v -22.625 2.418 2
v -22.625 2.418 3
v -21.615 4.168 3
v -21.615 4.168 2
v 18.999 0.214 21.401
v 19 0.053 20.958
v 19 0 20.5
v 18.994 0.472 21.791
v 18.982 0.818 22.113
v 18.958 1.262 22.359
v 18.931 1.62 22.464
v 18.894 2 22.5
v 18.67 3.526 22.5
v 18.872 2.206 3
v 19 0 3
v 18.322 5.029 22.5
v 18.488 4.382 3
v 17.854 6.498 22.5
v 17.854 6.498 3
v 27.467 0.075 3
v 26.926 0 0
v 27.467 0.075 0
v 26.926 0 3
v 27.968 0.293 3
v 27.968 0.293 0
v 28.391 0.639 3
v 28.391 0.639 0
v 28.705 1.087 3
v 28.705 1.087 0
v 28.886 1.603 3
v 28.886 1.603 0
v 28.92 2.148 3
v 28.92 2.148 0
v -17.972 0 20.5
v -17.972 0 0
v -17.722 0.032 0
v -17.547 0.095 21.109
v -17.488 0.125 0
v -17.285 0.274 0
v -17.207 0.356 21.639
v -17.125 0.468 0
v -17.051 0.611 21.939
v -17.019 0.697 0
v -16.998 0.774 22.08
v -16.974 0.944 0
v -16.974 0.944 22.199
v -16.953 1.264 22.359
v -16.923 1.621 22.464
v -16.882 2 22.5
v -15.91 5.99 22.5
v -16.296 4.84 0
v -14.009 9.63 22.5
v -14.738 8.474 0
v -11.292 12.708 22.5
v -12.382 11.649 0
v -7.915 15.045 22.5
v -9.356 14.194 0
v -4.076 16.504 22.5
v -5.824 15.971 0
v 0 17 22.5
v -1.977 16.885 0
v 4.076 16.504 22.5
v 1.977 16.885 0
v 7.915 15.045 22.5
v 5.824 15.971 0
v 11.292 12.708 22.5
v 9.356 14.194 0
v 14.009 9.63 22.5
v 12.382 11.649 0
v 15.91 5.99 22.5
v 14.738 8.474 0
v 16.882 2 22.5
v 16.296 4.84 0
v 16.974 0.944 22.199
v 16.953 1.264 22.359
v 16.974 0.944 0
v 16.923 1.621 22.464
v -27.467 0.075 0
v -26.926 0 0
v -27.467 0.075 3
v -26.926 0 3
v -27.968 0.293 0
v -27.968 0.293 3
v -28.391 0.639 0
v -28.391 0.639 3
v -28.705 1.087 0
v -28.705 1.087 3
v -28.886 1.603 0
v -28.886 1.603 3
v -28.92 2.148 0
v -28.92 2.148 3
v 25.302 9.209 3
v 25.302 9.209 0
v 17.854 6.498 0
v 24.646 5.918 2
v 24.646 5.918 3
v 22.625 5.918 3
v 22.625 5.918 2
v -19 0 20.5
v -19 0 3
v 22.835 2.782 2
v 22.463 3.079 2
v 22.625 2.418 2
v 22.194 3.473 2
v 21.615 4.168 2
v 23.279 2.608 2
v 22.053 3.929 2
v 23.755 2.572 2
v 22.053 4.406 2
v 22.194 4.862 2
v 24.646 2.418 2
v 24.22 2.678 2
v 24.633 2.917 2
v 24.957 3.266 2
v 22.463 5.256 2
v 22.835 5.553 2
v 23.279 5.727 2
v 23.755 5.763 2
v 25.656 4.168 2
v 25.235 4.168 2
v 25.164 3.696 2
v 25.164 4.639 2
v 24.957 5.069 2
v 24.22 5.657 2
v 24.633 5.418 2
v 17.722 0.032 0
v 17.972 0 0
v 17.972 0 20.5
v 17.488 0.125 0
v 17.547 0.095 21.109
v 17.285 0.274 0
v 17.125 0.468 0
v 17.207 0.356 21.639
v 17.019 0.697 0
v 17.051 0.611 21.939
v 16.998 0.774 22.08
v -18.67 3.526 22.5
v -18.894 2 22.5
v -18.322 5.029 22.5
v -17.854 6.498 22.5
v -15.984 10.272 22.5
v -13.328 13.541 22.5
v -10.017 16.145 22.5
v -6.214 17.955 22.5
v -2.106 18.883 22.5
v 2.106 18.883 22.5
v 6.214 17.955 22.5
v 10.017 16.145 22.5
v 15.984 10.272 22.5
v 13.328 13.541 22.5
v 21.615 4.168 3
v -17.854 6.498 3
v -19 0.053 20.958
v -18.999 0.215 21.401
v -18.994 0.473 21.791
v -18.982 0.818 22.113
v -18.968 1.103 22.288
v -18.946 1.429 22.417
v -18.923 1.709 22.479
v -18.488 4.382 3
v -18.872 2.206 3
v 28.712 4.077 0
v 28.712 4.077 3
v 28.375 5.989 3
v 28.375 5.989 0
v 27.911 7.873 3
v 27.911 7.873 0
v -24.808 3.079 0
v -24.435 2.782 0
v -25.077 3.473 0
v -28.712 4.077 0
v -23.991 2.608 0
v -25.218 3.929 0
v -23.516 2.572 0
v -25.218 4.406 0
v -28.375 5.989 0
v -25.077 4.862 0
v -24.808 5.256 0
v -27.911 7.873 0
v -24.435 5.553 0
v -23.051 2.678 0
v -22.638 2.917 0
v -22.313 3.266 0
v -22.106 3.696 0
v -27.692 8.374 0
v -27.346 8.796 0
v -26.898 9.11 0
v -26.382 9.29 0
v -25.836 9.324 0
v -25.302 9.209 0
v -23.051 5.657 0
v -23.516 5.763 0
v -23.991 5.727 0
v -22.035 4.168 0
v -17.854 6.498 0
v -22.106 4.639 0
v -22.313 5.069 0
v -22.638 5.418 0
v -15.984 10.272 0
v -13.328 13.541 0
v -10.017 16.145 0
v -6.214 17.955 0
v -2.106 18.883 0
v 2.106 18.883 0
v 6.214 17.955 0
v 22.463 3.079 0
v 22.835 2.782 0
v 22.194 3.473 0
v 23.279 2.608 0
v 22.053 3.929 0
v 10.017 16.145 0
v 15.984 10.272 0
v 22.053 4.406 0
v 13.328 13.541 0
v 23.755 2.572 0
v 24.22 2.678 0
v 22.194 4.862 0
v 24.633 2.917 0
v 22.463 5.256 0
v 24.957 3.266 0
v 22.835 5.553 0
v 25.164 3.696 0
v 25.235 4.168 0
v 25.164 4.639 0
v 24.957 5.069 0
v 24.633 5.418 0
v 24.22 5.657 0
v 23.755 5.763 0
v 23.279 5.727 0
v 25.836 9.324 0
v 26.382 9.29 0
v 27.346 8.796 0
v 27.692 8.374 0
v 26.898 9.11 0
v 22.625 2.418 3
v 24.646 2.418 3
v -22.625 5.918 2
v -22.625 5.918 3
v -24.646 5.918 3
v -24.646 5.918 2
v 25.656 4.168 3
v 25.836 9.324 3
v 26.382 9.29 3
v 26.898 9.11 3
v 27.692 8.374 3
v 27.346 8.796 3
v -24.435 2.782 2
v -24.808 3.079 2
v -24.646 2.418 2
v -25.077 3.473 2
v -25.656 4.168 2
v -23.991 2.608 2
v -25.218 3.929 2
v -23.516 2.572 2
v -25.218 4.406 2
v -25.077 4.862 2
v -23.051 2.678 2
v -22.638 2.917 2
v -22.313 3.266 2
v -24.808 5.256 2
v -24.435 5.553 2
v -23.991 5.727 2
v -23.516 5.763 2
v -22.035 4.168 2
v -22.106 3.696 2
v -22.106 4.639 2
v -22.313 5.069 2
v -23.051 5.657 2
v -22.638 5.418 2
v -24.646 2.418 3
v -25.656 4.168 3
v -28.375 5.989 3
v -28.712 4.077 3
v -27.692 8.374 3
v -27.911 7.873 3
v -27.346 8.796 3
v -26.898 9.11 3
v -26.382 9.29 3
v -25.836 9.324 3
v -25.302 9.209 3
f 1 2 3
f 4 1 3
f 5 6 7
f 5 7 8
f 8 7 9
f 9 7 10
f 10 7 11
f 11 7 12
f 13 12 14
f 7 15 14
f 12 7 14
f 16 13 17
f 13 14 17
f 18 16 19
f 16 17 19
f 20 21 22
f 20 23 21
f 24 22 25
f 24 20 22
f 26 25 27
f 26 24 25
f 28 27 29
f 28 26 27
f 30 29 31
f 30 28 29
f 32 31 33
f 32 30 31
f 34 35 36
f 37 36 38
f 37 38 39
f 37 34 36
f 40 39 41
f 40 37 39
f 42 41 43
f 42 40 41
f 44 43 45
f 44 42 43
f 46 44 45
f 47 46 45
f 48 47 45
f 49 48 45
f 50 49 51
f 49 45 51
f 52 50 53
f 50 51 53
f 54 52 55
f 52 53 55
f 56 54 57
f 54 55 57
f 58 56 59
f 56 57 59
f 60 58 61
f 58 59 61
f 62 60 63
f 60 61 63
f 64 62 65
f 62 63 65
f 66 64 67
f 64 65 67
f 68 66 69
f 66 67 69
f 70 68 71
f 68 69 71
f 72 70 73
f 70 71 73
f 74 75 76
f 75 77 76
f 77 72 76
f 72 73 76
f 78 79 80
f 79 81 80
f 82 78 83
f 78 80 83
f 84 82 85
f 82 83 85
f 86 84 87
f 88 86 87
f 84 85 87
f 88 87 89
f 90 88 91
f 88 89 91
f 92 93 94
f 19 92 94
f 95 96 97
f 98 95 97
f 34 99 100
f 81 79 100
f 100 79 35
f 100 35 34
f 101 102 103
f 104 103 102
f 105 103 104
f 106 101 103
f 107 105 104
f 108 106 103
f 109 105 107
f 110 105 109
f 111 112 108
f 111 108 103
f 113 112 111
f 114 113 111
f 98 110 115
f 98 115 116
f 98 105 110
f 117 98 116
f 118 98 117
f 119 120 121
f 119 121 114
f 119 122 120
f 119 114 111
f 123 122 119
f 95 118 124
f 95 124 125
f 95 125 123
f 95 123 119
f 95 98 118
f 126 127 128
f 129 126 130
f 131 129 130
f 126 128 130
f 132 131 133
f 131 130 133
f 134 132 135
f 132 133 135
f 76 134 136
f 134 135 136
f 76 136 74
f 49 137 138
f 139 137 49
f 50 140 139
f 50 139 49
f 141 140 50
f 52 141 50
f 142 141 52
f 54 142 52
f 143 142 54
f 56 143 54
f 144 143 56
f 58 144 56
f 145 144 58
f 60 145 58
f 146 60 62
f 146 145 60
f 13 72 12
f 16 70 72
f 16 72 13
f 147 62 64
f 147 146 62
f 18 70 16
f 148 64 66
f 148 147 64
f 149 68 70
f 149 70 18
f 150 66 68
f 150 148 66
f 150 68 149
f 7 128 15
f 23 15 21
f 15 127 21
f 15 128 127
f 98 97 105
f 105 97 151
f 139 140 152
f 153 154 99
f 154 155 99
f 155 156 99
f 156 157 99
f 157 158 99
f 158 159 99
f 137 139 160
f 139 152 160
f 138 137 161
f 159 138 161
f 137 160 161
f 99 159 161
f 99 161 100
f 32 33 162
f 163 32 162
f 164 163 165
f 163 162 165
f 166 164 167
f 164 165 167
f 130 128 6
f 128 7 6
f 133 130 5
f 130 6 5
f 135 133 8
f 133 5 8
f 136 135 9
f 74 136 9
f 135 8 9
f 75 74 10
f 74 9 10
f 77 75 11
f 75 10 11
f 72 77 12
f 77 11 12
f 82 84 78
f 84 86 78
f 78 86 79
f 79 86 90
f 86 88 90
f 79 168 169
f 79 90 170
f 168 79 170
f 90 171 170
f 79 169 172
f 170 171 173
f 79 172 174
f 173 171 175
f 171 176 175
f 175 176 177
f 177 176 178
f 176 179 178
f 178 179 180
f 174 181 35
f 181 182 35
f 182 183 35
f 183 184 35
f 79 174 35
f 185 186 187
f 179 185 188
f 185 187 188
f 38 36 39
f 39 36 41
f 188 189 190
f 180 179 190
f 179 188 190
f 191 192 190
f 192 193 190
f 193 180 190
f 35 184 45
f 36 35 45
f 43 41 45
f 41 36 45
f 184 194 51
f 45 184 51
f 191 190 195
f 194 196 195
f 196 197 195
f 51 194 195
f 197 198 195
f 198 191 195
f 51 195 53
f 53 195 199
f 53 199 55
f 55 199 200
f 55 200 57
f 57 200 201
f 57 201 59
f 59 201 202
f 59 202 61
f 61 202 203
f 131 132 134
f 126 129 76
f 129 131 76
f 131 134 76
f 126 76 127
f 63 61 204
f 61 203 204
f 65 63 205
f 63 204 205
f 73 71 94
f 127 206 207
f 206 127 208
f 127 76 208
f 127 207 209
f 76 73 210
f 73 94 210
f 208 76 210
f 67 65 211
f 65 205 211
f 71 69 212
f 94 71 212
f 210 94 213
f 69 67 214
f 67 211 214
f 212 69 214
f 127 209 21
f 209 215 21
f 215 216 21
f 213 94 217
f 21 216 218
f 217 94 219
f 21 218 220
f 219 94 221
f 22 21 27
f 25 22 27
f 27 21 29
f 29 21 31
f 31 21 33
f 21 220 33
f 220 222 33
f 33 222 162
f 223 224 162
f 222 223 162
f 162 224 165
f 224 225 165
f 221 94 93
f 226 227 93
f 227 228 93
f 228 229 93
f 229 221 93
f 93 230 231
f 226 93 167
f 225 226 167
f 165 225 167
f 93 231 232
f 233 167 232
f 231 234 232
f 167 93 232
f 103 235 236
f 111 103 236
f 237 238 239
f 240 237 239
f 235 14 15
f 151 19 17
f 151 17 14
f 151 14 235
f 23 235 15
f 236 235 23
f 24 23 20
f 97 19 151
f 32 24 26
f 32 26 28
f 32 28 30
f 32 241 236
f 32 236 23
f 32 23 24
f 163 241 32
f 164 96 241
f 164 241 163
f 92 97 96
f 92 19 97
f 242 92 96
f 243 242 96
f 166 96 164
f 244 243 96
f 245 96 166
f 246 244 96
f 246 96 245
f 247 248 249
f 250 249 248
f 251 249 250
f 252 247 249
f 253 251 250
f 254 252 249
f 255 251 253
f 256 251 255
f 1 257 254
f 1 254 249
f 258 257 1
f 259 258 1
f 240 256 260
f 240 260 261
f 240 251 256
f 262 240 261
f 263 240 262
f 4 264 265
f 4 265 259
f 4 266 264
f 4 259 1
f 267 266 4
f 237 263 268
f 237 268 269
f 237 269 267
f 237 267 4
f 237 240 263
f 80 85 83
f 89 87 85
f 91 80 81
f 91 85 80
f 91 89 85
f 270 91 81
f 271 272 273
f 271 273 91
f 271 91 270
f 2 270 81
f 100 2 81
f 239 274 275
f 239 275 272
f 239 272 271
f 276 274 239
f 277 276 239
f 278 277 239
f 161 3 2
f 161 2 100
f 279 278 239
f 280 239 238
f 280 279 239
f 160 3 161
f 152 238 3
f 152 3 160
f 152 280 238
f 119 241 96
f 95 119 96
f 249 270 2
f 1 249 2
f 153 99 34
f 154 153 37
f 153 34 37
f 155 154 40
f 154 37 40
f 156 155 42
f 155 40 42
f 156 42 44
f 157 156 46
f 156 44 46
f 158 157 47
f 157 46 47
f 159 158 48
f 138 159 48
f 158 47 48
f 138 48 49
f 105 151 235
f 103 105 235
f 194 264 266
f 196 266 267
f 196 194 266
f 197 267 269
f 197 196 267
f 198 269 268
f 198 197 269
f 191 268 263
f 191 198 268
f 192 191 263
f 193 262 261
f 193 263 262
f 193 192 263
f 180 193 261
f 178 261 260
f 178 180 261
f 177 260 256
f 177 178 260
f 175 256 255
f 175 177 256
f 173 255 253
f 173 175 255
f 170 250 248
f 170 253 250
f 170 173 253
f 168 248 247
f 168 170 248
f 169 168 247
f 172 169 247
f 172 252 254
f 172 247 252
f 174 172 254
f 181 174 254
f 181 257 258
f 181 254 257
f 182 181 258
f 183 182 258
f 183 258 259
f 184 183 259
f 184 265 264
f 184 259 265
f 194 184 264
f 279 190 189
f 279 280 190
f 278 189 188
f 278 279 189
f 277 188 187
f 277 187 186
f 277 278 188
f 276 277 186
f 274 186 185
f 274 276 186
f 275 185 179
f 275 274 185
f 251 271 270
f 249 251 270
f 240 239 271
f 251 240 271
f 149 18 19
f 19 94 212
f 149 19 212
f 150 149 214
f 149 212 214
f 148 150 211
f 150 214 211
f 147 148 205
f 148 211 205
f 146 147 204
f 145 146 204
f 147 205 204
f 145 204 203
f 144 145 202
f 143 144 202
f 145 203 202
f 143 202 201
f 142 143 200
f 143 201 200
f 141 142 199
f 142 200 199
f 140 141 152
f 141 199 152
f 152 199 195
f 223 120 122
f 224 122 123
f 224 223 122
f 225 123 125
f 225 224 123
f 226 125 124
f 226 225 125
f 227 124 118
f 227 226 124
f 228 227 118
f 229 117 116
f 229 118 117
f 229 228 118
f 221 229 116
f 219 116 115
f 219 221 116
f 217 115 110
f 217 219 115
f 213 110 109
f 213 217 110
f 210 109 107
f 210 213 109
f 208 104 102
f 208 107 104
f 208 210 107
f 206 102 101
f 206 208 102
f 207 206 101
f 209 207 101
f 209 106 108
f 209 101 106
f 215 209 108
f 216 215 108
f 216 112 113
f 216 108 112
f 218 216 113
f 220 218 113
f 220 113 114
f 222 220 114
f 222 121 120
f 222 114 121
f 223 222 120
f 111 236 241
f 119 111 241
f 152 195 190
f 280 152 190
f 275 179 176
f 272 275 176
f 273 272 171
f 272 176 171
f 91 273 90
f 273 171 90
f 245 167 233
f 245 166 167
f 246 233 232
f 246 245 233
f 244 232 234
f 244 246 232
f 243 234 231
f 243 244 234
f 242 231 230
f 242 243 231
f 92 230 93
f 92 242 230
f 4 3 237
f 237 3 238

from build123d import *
from OCP.BRepFilletAPI import BRepFilletAPI_MakeFillet

# Parameters (mm, degrees)
SKETCH2_R             = 1.6
BOSS_EXTRUDE1_DEPTH   = 3
BOSS_EXTRUDE1_2_DEPTH = 3
BOSS_EXTRUDE2_DEPTH   = 22.5
FILLET1_R1            = 2
FILLET1_R2            = 1
CUT_EXTRUDE2_DEPTH    = 1


with BuildPart() as part:
    # Sketch2 → Boss-Extrude1 (new body)
    with BuildSketch(Plane.XY):
        with BuildLine():
            ThreePointArc((-19, 0), (-18.711347307, 3.299315376), (-17.854159795, 6.498382723))
            Line((-17.854159795, 6.498382723), (-27.251086003, 9.918584156))
            ThreePointArc((-27.251086003, 9.918584156), (-28.559424837, 5.035797152), (-29, 0))
            Line((-29, 0), (-19, 0))
        make_face()
        with Locations((-23.635386072, 4.167556264)):
            Circle(SKETCH2_R, mode=Mode.SUBTRACT)
    extrude(amount=BOSS_EXTRUDE1_DEPTH)



with BuildPart() as body_2:
    # Sketch2 → Boss-Extrude1 2 (new body)
    with BuildSketch(Plane.XY):
        with BuildLine():
            ThreePointArc((17.854159795, 6.498382723), (18.711347307, 3.299315376), (19, 0))
            Line((19, 0), (29, 0))
            ThreePointArc((29, 0), (28.559424837, 5.035797152), (27.251086003, 9.918584156))
            Line((27.251086003, 9.918584156), (17.854159795, 6.498382723))
        make_face()
        with Locations((23.635386072, 4.167556264)):
            Circle(SKETCH2_R, mode=Mode.SUBTRACT)
    extrude(amount=BOSS_EXTRUDE1_2_DEPTH)


with BuildPart() as part_1:
    add(part.part)

    add(body_2.part)  # Boss-Extrude2 merges body 2
    # Sketch2<3> → Boss-Extrude2 (add)
    with BuildSketch(Plane.XY):
        with BuildLine():
            Line((-19, 0), (-17, 0))
            ThreePointArc((-17, 0), (0, 17), (17, 0))
            Line((17, 0), (19, 0))
            ThreePointArc((19, 0), (18.711347307, 3.299315376), (17.854159795, 6.498382723))
            ThreePointArc((17.854159795, 6.498382723), (0, 19), (-17.854159795, 6.498382723))
            ThreePointArc((-17.854159795, 6.498382723), (-18.711347307, 3.299315376), (-19, 0))
        make_face()
    extrude(amount=BOSS_EXTRUDE2_DEPTH)

    # Fillet1: one fillet with a radius per group of edges: ONE call of the kernel's fillet builder (fillet() takes one radius for all edges)
    fillet1_edges_1 = [part_1.edges().sort_by_distance(p)[0] for p in [
        (-29, 0, 1.5),
        (-27.251086003, 9.918584156, 1.5),
        (-18, 0, 22.5),
        (18, 0, 22.5),
        (29, 0, 1.5),
        (27.251086003, 9.918584156, 1.5),
    ]]
    fillet1_edges_2 = [part_1.edges().sort_by_distance(p)[0] for p in [
        (-17, 0, 11.25),
        (17, 0, 11.25),
    ]]
    fillet1 = BRepFilletAPI_MakeFillet(part_1.part.solid().wrapped)
    for e in fillet1_edges_1:
        fillet1.Add(FILLET1_R1, e.wrapped)
    for e in fillet1_edges_2:
        fillet1.Add(FILLET1_R2, e.wrapped)
    add(Compound.cast(fillet1.Shape()), mode=Mode.REPLACE)

    # Sketch4 → Cut-Extrude2 (cut)
    with BuildSketch(Plane.XY.offset(3)):
        Polygon((-21.61466013, 4.167556264), (-22.625023101, 5.917556264), (-24.645749043, 5.917556264), (-25.656112014, 4.167556264), (-24.645749043, 2.417556264), (-22.625023101, 2.417556264), align=None)
        Polygon((25.656112014, 4.167556264), (24.645749043, 5.917556264), (22.625023101, 5.917556264), (21.61466013, 4.167556264), (22.625023101, 2.417556264), (24.645749043, 2.417556264), align=None)
    extrude(amount=-CUT_EXTRUDE2_DEPTH, mode=Mode.SUBTRACT)


solid = part_1.part
